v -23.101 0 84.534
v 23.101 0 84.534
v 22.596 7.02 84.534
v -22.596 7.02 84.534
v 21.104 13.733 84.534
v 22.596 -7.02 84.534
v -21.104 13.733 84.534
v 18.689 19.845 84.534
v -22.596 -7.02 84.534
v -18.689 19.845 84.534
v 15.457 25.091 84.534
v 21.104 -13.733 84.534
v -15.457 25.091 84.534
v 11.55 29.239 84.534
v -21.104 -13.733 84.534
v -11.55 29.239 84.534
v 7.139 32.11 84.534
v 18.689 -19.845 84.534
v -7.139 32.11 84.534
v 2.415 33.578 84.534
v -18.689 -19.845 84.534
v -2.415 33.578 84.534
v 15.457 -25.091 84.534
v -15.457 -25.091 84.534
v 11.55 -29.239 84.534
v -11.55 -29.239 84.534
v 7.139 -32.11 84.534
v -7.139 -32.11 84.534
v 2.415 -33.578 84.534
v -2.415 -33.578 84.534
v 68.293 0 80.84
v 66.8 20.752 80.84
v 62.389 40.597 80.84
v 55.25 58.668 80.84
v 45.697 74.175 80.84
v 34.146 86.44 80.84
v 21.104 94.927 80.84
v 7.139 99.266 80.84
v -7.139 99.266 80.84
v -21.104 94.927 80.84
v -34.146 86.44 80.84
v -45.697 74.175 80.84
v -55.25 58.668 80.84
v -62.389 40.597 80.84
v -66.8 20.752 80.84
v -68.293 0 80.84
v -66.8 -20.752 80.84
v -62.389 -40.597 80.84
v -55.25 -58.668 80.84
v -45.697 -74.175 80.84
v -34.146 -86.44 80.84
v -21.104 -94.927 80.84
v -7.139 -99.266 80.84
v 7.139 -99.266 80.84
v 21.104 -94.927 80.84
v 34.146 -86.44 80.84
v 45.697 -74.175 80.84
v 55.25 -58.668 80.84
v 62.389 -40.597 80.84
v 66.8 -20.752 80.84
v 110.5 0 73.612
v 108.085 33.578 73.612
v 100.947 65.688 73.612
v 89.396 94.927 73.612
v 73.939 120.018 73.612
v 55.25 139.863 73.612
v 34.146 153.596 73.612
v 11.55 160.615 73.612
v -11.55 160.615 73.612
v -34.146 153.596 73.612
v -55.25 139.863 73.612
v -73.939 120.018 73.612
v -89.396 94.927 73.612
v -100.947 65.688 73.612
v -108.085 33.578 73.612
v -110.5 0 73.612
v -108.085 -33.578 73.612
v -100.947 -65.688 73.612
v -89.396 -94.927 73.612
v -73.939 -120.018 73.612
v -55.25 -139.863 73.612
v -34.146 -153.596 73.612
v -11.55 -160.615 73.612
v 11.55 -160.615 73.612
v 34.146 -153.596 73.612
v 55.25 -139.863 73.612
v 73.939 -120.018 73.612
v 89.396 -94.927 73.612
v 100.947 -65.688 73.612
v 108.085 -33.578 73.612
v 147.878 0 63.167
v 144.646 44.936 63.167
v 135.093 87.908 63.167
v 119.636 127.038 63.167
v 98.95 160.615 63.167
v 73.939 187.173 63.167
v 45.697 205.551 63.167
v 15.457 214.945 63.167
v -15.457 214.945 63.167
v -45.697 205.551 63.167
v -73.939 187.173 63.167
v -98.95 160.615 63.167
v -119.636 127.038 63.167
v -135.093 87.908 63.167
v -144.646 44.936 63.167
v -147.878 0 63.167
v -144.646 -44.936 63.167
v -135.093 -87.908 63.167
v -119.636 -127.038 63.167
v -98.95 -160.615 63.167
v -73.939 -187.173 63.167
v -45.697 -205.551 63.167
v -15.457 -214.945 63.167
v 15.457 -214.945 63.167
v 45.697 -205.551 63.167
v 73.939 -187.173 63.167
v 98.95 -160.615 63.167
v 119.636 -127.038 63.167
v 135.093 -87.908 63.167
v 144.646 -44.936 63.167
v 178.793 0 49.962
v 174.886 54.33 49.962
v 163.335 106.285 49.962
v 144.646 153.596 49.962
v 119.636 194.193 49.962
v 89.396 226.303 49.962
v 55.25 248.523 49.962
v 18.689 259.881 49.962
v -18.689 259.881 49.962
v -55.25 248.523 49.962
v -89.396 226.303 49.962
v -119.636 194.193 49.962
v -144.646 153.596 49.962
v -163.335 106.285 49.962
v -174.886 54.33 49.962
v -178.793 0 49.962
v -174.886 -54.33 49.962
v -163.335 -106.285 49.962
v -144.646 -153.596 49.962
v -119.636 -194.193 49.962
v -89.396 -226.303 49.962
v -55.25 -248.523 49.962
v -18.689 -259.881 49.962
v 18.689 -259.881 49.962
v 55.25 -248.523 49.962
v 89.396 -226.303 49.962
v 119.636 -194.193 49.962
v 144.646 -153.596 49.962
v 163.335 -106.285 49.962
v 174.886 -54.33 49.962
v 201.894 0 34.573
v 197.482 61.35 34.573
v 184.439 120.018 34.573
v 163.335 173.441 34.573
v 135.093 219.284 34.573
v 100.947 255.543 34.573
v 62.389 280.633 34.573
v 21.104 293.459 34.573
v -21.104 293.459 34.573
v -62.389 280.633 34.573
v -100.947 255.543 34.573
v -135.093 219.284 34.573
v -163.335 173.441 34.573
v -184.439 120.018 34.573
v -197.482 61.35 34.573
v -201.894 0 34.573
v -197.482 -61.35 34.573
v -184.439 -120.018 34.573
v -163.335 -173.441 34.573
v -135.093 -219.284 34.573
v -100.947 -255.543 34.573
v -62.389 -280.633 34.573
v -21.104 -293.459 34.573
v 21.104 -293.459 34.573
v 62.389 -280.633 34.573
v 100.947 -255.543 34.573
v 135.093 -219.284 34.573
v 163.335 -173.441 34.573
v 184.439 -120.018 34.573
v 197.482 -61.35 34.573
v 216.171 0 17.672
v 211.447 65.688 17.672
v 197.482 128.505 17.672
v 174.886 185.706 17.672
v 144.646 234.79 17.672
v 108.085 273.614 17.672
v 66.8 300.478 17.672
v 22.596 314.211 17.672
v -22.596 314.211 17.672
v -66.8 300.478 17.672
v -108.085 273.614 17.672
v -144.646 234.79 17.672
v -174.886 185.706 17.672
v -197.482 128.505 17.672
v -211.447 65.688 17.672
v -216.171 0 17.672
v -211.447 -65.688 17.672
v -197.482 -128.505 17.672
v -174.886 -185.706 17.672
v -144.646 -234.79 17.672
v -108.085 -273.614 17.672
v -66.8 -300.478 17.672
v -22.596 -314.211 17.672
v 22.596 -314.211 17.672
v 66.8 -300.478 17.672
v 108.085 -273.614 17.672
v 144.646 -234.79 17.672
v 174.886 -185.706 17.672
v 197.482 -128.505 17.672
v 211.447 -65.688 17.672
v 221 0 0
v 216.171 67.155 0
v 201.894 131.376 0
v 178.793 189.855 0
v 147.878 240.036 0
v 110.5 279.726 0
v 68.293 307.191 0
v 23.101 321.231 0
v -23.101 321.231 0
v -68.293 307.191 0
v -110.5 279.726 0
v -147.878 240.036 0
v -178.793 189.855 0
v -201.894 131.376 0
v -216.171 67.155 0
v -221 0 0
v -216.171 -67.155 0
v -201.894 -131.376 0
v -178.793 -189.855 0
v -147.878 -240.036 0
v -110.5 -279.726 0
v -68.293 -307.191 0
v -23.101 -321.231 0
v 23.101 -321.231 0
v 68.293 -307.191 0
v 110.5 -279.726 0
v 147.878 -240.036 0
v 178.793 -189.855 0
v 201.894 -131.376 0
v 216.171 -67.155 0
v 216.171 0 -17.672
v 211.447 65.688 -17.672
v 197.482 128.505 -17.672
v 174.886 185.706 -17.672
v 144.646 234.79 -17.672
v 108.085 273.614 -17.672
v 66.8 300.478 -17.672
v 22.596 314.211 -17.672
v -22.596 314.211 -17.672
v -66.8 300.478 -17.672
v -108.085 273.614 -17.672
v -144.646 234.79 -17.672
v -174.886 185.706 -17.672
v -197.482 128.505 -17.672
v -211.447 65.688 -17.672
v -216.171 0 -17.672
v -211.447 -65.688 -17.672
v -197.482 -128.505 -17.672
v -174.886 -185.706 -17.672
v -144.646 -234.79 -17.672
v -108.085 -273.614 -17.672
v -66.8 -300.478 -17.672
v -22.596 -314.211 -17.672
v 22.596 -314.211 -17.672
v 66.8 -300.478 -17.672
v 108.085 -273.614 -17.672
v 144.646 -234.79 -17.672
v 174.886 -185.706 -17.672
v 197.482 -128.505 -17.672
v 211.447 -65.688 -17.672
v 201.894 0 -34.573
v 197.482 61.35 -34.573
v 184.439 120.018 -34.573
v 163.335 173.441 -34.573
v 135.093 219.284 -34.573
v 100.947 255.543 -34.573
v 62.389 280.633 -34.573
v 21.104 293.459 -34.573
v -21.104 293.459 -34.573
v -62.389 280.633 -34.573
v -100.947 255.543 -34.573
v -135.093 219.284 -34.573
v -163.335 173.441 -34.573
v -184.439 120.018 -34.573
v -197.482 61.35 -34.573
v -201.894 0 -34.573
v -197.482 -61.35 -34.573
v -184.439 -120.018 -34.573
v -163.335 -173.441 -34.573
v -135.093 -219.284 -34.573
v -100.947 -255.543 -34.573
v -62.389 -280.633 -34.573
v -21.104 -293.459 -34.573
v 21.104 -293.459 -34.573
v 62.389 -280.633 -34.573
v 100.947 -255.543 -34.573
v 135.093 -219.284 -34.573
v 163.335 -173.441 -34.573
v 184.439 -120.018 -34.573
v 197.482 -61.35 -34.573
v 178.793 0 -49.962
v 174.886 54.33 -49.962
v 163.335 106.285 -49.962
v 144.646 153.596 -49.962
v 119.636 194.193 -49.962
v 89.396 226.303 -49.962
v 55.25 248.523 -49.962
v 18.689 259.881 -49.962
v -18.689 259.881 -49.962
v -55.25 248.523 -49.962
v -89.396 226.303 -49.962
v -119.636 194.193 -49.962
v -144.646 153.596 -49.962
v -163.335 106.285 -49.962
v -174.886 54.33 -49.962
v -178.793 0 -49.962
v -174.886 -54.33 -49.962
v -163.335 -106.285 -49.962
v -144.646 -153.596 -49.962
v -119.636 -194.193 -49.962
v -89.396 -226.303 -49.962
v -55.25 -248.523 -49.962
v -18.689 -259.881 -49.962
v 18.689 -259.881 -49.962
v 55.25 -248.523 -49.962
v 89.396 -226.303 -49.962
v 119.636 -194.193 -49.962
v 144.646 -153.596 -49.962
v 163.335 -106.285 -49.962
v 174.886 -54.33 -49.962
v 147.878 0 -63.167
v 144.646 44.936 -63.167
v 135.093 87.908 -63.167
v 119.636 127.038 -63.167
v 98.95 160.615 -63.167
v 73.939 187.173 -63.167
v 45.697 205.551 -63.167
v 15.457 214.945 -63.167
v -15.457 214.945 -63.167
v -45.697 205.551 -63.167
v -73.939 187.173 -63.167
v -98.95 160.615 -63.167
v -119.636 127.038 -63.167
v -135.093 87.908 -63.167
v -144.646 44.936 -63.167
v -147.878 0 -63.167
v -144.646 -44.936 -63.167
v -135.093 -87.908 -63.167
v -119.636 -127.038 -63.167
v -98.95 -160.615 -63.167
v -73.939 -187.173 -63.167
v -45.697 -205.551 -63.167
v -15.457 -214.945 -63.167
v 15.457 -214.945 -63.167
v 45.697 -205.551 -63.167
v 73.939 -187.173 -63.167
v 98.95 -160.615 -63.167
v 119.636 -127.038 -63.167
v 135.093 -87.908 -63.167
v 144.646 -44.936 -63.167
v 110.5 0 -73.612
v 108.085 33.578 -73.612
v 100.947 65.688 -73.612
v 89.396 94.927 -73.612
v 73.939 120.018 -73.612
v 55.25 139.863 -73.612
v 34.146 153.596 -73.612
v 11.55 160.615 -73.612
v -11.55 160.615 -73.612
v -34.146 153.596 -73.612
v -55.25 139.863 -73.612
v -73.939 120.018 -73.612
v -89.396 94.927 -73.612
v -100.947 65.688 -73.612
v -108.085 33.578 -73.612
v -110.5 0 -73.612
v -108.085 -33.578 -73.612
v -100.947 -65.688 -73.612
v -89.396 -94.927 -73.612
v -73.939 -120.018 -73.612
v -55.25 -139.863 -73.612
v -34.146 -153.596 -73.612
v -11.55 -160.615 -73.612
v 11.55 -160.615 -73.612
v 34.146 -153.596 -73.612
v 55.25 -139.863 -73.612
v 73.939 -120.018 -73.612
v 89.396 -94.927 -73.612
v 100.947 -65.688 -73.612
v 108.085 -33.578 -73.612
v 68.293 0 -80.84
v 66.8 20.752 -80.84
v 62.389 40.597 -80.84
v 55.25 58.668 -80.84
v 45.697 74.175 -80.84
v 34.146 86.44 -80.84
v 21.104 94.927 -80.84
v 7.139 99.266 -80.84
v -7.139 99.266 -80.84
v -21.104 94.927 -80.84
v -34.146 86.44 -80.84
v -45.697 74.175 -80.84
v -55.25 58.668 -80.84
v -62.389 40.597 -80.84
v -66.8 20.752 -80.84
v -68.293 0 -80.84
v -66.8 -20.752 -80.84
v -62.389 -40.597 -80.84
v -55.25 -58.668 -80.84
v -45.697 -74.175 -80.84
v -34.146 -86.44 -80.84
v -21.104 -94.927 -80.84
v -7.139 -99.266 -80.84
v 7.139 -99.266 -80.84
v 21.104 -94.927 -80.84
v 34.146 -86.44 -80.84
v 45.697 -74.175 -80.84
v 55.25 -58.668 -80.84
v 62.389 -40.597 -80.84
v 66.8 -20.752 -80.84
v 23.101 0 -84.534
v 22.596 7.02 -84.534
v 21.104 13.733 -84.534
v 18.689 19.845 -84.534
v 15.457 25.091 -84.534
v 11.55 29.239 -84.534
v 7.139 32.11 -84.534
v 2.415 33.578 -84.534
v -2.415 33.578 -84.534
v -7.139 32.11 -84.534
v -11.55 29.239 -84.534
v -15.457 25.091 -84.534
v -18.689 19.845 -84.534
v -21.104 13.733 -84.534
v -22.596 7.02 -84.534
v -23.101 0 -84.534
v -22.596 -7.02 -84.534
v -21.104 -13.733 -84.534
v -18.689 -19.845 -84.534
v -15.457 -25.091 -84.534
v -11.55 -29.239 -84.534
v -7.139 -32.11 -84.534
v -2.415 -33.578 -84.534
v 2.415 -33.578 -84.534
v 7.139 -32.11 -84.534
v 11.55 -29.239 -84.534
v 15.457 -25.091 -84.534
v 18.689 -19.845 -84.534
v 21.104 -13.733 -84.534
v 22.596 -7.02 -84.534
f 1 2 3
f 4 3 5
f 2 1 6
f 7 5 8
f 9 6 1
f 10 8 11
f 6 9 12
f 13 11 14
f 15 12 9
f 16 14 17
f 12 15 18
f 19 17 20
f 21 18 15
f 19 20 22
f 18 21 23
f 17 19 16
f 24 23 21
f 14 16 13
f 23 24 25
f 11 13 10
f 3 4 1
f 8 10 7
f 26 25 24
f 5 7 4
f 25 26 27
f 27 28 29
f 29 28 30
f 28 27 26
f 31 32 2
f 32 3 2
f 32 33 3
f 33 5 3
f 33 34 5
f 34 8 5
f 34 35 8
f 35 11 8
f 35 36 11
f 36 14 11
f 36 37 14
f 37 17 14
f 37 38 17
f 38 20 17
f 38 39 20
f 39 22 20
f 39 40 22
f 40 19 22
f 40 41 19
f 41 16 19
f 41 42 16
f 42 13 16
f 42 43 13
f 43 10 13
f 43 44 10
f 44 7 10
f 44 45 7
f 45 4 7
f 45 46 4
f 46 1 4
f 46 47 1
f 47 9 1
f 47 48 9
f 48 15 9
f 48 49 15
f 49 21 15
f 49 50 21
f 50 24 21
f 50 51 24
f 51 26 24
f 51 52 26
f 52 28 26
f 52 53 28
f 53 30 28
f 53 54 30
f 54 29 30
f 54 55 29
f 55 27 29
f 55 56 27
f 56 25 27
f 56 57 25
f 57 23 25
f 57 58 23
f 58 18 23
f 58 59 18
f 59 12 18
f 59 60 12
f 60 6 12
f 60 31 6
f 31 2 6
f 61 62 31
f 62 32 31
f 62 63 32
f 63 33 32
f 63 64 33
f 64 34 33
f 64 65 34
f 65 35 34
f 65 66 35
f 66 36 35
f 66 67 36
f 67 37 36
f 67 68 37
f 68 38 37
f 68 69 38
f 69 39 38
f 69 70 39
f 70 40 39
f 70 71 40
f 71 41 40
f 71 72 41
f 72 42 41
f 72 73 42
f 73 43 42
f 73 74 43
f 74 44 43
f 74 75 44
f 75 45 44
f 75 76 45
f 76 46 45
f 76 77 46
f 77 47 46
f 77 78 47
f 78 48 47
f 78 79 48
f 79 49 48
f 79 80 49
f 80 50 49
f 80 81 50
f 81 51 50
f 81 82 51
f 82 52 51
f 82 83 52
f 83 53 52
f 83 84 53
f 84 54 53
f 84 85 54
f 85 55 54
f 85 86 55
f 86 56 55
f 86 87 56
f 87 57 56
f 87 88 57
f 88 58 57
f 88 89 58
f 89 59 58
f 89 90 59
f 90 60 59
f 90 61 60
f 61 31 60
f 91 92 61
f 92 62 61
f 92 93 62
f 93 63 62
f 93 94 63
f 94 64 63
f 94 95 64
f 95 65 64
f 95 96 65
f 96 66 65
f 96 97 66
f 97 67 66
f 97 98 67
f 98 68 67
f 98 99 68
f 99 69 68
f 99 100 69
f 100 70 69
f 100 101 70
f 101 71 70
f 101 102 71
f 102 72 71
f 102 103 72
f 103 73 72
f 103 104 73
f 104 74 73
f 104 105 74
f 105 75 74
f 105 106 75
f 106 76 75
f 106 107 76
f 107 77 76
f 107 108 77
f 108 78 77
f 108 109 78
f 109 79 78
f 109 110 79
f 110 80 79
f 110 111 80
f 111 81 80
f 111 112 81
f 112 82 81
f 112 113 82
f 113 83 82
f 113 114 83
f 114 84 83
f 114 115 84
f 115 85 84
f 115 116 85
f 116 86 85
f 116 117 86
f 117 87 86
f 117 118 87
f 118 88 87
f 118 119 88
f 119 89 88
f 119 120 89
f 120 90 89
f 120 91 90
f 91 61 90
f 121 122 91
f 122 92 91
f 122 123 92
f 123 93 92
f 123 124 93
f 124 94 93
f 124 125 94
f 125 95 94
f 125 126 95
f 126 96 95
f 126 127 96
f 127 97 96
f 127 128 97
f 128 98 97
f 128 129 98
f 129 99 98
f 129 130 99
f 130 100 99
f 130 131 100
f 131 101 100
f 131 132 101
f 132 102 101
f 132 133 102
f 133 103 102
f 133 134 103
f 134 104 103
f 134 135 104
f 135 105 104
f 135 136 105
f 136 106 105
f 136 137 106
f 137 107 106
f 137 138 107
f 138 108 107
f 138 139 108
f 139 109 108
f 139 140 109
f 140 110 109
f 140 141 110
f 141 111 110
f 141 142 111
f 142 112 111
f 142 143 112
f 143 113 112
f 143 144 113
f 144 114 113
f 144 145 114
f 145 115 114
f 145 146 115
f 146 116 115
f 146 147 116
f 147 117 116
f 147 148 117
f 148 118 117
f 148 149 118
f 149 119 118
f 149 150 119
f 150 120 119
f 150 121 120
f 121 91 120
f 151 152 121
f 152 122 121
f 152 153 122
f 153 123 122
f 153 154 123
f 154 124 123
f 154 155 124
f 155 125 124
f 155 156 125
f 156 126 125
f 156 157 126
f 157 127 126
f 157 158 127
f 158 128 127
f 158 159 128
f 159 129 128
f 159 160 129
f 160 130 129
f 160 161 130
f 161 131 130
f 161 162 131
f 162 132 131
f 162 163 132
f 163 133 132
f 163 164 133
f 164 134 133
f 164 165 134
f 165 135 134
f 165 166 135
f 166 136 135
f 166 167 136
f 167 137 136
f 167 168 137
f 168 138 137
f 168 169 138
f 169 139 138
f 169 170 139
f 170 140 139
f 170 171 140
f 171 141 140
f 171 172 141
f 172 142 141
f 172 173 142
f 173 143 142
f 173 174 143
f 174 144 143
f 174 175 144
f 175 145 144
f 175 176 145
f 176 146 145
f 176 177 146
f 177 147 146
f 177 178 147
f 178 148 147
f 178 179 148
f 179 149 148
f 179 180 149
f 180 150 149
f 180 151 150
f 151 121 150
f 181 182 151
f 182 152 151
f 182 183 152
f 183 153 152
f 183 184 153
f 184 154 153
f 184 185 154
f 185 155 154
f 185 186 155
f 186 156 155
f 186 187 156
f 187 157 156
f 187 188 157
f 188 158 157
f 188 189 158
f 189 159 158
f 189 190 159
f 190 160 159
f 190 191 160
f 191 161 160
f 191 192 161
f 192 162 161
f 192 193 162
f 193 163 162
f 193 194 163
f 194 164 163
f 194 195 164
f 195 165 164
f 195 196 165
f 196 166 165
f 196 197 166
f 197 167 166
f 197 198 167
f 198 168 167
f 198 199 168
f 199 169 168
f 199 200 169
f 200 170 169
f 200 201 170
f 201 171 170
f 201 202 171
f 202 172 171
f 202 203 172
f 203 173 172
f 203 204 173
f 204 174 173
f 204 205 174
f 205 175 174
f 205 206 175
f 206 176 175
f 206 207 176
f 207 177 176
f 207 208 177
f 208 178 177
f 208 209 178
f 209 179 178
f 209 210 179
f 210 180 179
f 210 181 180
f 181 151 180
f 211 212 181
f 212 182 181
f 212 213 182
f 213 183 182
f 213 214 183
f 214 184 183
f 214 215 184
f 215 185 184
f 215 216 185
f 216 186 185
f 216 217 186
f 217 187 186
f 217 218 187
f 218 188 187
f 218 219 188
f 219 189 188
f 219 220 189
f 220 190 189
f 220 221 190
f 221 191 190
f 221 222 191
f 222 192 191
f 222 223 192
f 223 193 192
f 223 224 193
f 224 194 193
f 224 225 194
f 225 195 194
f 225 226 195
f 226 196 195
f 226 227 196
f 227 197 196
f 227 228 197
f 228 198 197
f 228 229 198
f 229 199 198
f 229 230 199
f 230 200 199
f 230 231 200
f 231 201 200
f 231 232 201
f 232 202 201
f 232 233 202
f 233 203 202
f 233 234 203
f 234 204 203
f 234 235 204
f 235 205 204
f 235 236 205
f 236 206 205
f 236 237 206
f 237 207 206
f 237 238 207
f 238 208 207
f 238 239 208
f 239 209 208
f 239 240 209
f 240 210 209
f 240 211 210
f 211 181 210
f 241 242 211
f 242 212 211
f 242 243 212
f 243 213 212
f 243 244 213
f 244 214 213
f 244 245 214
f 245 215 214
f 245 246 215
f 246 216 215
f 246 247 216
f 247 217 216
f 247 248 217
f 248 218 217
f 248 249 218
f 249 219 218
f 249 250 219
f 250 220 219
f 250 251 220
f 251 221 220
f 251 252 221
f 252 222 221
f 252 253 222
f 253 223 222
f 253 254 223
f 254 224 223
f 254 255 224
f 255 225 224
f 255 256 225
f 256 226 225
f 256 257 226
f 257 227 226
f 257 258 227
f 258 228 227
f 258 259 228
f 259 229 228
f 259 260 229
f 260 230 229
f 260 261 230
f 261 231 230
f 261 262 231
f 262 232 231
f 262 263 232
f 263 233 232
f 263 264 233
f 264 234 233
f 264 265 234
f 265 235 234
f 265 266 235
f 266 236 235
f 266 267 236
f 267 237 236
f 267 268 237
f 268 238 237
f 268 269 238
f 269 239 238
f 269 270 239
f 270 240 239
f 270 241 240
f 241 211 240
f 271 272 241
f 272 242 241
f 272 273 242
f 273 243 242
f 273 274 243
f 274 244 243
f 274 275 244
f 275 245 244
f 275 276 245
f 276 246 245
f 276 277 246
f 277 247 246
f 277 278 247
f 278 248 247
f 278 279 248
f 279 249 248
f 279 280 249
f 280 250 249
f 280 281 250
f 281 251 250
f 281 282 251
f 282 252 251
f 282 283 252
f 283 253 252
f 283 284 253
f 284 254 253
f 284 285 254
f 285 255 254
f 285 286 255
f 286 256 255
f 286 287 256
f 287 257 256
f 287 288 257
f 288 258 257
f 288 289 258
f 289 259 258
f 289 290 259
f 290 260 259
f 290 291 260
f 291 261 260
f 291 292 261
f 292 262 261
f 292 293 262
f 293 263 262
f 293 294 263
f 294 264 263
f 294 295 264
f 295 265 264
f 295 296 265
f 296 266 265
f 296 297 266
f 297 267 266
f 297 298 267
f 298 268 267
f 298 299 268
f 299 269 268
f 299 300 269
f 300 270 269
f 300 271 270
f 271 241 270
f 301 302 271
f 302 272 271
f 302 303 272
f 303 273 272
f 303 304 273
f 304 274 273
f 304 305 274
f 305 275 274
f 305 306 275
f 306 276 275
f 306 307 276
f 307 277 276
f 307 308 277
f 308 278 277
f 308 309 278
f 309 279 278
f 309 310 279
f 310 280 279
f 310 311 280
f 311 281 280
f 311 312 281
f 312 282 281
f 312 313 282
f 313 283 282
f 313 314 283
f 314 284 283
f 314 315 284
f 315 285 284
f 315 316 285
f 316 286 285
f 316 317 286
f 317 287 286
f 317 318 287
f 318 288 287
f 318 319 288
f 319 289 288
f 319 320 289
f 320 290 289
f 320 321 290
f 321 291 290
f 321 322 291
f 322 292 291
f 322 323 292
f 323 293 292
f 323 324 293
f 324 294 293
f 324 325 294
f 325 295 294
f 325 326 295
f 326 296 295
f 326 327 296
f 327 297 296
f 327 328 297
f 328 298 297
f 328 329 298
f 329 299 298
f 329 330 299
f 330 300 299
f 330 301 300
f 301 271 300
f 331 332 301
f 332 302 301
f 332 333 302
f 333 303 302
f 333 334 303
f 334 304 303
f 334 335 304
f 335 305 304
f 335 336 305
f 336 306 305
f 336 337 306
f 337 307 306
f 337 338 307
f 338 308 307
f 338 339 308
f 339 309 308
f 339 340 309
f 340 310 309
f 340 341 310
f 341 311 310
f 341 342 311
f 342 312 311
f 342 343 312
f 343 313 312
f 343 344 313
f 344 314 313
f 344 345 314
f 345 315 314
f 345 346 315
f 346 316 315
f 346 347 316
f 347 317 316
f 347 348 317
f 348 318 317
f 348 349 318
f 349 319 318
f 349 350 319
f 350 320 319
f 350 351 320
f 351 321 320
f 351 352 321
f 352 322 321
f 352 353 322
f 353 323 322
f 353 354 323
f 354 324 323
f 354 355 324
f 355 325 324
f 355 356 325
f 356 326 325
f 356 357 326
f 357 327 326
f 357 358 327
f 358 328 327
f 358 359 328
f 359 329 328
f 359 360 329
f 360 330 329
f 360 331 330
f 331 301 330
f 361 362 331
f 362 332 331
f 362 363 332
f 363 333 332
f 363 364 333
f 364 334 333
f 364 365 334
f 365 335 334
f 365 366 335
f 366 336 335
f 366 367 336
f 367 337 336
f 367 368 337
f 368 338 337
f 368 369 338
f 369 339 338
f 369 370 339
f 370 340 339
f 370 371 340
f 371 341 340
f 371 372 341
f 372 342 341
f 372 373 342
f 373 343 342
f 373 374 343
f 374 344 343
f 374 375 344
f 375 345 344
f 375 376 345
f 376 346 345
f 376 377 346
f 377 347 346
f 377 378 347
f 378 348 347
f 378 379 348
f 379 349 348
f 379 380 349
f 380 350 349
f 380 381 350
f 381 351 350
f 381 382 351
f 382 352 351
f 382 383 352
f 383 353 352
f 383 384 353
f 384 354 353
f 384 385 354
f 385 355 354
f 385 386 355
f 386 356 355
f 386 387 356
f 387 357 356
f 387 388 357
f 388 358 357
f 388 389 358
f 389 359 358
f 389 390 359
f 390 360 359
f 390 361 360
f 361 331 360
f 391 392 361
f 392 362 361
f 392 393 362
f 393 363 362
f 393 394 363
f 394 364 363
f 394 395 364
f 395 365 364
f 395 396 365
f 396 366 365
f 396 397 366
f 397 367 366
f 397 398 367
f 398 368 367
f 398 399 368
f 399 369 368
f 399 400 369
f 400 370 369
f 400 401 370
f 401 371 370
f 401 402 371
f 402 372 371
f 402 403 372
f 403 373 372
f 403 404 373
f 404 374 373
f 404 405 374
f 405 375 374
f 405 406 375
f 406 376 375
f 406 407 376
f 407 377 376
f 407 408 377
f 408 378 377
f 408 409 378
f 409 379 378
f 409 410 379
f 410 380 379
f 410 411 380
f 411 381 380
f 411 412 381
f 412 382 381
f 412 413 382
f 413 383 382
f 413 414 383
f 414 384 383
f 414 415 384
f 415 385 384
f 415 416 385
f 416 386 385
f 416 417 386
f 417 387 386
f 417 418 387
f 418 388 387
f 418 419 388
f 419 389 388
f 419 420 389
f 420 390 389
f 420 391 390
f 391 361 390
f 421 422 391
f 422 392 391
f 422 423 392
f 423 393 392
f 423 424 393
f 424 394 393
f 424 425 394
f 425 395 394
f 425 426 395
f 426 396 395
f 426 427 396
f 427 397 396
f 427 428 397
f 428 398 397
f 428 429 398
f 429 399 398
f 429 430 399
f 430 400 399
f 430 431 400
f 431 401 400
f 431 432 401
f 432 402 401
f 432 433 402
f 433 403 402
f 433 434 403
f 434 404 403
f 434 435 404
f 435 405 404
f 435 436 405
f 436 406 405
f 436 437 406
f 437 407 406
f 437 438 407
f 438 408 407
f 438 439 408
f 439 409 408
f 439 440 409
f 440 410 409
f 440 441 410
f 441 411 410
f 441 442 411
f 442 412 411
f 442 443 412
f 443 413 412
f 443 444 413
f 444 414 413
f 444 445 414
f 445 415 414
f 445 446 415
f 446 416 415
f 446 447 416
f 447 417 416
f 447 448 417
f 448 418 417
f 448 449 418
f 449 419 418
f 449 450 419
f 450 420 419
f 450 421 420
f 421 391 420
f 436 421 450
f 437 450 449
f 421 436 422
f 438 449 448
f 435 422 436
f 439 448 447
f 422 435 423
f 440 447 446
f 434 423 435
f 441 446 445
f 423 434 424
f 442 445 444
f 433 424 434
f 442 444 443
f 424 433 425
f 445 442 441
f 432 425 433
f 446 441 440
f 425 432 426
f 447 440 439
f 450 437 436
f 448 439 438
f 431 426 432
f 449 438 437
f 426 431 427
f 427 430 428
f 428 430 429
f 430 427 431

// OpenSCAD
// Generated by SolidPython 1.0.1 on 2020-07-29 00:46:51


scale(v = [13, 19, 5]) {
	sphere(r = 17);
}
/***********************************************
*********      SolidPython code:      **********
************************************************
 
# import packages: SolidPython
from solid import *
from solid.utils import *
from itertools import chain, combinations, permutations


class Resize:

    def __init__(self, scad_file):
        self.scad_file = scad_file
        #self.scad_file = import_scad(scad_file)
        # cone/cylinder param:
        self.r1 = 0
        self.r2 = 0
        self.h = 0
        # rectangular prism param:
        self.w = 0
        self.l = 0
        # ellipse param:
        self.r = 0

    # import OpenScad code (file name corresponds to shape)


    # classify shape + parameters
    def assign(self, param1, param2, param3):
        if self.scad_file == 'cone.scad':
            self.r1 = param1
            self.r2 = param2
            self.h = param3
        elif self.scad_file == 'cylinder.scad':
            self.r1 = param1
            self.r2 = param2
            self.h = param3
        elif self.scad_file == 'rectangularPrism.scad':
            self.h = param1
            self.l = param2
            self.w = param3
        else:
            self.r = param1
            self.h = param2

    # resize parameters
    def iterate(self):
        x = range(3, 20, 2)
        i = 1
        if self.scad_file == 'cone.scad':
            tempList = list(permutations(x, 2))
            for temp in tempList:
                param1 = temp[0]
                param2 = temp[1]
                filepath = 'produced_scad_files/' + 'cone' + str(param1) + '_' + str(param2) + '_' + '.scad'
                scad_render_to_file(cylinder(h=param1, r1=param2, r2=0), filepath)

        elif self.scad_file == 'cylinder.scad':
            tempList = list(permutations(x, 3))
            for temp in tempList:
                param1 = temp[0]
                param2 = temp[1]
                filepath = 'produced_scad_files/' + 'cylinder' + str(param1) + '_' + str(param2) + '_' + '.scad'
                scad_render_to_file(cylinder(h=param1, r1=param2, r2=param2), filepath)

        elif self.scad_file == 'rectangularPrism.scad':
            tempList = list(permutations(x, 3))
            for temp in tempList:
                param1 = temp[0]
                param2 = temp[1]
                param3 = temp[2]
                filepath = 'produced_scad_files/' + 'rectangularPrism' + str(param1) + '_' + str(param2) + '_' + str(
                    param3) + '.scad'
                scad_render_to_file(cube(size=(param1, param2, param3)), filepath)

        elif self.scad_file == 'ellipse.scad':
            tempList = list(permutations(x, 4))
            for temp in tempList:
                param1 = temp[0]
                param2 = temp[1]
                param3 = temp[2]
                param4 = temp[3]
                filepath = 'produced_scad_files/' + 'ellipse' + str(param1) + '_' + str(param2) + '_' + str(param3) + '_' + str(param4) + '.scad'
                scad_render_to_file(scale([param1, param2, param3])(sphere(r=param4)), filepath)

    def render_to_scadfile(self):
        scad_render_to_file(scad, 'example.scad') 
 
************************************************/
